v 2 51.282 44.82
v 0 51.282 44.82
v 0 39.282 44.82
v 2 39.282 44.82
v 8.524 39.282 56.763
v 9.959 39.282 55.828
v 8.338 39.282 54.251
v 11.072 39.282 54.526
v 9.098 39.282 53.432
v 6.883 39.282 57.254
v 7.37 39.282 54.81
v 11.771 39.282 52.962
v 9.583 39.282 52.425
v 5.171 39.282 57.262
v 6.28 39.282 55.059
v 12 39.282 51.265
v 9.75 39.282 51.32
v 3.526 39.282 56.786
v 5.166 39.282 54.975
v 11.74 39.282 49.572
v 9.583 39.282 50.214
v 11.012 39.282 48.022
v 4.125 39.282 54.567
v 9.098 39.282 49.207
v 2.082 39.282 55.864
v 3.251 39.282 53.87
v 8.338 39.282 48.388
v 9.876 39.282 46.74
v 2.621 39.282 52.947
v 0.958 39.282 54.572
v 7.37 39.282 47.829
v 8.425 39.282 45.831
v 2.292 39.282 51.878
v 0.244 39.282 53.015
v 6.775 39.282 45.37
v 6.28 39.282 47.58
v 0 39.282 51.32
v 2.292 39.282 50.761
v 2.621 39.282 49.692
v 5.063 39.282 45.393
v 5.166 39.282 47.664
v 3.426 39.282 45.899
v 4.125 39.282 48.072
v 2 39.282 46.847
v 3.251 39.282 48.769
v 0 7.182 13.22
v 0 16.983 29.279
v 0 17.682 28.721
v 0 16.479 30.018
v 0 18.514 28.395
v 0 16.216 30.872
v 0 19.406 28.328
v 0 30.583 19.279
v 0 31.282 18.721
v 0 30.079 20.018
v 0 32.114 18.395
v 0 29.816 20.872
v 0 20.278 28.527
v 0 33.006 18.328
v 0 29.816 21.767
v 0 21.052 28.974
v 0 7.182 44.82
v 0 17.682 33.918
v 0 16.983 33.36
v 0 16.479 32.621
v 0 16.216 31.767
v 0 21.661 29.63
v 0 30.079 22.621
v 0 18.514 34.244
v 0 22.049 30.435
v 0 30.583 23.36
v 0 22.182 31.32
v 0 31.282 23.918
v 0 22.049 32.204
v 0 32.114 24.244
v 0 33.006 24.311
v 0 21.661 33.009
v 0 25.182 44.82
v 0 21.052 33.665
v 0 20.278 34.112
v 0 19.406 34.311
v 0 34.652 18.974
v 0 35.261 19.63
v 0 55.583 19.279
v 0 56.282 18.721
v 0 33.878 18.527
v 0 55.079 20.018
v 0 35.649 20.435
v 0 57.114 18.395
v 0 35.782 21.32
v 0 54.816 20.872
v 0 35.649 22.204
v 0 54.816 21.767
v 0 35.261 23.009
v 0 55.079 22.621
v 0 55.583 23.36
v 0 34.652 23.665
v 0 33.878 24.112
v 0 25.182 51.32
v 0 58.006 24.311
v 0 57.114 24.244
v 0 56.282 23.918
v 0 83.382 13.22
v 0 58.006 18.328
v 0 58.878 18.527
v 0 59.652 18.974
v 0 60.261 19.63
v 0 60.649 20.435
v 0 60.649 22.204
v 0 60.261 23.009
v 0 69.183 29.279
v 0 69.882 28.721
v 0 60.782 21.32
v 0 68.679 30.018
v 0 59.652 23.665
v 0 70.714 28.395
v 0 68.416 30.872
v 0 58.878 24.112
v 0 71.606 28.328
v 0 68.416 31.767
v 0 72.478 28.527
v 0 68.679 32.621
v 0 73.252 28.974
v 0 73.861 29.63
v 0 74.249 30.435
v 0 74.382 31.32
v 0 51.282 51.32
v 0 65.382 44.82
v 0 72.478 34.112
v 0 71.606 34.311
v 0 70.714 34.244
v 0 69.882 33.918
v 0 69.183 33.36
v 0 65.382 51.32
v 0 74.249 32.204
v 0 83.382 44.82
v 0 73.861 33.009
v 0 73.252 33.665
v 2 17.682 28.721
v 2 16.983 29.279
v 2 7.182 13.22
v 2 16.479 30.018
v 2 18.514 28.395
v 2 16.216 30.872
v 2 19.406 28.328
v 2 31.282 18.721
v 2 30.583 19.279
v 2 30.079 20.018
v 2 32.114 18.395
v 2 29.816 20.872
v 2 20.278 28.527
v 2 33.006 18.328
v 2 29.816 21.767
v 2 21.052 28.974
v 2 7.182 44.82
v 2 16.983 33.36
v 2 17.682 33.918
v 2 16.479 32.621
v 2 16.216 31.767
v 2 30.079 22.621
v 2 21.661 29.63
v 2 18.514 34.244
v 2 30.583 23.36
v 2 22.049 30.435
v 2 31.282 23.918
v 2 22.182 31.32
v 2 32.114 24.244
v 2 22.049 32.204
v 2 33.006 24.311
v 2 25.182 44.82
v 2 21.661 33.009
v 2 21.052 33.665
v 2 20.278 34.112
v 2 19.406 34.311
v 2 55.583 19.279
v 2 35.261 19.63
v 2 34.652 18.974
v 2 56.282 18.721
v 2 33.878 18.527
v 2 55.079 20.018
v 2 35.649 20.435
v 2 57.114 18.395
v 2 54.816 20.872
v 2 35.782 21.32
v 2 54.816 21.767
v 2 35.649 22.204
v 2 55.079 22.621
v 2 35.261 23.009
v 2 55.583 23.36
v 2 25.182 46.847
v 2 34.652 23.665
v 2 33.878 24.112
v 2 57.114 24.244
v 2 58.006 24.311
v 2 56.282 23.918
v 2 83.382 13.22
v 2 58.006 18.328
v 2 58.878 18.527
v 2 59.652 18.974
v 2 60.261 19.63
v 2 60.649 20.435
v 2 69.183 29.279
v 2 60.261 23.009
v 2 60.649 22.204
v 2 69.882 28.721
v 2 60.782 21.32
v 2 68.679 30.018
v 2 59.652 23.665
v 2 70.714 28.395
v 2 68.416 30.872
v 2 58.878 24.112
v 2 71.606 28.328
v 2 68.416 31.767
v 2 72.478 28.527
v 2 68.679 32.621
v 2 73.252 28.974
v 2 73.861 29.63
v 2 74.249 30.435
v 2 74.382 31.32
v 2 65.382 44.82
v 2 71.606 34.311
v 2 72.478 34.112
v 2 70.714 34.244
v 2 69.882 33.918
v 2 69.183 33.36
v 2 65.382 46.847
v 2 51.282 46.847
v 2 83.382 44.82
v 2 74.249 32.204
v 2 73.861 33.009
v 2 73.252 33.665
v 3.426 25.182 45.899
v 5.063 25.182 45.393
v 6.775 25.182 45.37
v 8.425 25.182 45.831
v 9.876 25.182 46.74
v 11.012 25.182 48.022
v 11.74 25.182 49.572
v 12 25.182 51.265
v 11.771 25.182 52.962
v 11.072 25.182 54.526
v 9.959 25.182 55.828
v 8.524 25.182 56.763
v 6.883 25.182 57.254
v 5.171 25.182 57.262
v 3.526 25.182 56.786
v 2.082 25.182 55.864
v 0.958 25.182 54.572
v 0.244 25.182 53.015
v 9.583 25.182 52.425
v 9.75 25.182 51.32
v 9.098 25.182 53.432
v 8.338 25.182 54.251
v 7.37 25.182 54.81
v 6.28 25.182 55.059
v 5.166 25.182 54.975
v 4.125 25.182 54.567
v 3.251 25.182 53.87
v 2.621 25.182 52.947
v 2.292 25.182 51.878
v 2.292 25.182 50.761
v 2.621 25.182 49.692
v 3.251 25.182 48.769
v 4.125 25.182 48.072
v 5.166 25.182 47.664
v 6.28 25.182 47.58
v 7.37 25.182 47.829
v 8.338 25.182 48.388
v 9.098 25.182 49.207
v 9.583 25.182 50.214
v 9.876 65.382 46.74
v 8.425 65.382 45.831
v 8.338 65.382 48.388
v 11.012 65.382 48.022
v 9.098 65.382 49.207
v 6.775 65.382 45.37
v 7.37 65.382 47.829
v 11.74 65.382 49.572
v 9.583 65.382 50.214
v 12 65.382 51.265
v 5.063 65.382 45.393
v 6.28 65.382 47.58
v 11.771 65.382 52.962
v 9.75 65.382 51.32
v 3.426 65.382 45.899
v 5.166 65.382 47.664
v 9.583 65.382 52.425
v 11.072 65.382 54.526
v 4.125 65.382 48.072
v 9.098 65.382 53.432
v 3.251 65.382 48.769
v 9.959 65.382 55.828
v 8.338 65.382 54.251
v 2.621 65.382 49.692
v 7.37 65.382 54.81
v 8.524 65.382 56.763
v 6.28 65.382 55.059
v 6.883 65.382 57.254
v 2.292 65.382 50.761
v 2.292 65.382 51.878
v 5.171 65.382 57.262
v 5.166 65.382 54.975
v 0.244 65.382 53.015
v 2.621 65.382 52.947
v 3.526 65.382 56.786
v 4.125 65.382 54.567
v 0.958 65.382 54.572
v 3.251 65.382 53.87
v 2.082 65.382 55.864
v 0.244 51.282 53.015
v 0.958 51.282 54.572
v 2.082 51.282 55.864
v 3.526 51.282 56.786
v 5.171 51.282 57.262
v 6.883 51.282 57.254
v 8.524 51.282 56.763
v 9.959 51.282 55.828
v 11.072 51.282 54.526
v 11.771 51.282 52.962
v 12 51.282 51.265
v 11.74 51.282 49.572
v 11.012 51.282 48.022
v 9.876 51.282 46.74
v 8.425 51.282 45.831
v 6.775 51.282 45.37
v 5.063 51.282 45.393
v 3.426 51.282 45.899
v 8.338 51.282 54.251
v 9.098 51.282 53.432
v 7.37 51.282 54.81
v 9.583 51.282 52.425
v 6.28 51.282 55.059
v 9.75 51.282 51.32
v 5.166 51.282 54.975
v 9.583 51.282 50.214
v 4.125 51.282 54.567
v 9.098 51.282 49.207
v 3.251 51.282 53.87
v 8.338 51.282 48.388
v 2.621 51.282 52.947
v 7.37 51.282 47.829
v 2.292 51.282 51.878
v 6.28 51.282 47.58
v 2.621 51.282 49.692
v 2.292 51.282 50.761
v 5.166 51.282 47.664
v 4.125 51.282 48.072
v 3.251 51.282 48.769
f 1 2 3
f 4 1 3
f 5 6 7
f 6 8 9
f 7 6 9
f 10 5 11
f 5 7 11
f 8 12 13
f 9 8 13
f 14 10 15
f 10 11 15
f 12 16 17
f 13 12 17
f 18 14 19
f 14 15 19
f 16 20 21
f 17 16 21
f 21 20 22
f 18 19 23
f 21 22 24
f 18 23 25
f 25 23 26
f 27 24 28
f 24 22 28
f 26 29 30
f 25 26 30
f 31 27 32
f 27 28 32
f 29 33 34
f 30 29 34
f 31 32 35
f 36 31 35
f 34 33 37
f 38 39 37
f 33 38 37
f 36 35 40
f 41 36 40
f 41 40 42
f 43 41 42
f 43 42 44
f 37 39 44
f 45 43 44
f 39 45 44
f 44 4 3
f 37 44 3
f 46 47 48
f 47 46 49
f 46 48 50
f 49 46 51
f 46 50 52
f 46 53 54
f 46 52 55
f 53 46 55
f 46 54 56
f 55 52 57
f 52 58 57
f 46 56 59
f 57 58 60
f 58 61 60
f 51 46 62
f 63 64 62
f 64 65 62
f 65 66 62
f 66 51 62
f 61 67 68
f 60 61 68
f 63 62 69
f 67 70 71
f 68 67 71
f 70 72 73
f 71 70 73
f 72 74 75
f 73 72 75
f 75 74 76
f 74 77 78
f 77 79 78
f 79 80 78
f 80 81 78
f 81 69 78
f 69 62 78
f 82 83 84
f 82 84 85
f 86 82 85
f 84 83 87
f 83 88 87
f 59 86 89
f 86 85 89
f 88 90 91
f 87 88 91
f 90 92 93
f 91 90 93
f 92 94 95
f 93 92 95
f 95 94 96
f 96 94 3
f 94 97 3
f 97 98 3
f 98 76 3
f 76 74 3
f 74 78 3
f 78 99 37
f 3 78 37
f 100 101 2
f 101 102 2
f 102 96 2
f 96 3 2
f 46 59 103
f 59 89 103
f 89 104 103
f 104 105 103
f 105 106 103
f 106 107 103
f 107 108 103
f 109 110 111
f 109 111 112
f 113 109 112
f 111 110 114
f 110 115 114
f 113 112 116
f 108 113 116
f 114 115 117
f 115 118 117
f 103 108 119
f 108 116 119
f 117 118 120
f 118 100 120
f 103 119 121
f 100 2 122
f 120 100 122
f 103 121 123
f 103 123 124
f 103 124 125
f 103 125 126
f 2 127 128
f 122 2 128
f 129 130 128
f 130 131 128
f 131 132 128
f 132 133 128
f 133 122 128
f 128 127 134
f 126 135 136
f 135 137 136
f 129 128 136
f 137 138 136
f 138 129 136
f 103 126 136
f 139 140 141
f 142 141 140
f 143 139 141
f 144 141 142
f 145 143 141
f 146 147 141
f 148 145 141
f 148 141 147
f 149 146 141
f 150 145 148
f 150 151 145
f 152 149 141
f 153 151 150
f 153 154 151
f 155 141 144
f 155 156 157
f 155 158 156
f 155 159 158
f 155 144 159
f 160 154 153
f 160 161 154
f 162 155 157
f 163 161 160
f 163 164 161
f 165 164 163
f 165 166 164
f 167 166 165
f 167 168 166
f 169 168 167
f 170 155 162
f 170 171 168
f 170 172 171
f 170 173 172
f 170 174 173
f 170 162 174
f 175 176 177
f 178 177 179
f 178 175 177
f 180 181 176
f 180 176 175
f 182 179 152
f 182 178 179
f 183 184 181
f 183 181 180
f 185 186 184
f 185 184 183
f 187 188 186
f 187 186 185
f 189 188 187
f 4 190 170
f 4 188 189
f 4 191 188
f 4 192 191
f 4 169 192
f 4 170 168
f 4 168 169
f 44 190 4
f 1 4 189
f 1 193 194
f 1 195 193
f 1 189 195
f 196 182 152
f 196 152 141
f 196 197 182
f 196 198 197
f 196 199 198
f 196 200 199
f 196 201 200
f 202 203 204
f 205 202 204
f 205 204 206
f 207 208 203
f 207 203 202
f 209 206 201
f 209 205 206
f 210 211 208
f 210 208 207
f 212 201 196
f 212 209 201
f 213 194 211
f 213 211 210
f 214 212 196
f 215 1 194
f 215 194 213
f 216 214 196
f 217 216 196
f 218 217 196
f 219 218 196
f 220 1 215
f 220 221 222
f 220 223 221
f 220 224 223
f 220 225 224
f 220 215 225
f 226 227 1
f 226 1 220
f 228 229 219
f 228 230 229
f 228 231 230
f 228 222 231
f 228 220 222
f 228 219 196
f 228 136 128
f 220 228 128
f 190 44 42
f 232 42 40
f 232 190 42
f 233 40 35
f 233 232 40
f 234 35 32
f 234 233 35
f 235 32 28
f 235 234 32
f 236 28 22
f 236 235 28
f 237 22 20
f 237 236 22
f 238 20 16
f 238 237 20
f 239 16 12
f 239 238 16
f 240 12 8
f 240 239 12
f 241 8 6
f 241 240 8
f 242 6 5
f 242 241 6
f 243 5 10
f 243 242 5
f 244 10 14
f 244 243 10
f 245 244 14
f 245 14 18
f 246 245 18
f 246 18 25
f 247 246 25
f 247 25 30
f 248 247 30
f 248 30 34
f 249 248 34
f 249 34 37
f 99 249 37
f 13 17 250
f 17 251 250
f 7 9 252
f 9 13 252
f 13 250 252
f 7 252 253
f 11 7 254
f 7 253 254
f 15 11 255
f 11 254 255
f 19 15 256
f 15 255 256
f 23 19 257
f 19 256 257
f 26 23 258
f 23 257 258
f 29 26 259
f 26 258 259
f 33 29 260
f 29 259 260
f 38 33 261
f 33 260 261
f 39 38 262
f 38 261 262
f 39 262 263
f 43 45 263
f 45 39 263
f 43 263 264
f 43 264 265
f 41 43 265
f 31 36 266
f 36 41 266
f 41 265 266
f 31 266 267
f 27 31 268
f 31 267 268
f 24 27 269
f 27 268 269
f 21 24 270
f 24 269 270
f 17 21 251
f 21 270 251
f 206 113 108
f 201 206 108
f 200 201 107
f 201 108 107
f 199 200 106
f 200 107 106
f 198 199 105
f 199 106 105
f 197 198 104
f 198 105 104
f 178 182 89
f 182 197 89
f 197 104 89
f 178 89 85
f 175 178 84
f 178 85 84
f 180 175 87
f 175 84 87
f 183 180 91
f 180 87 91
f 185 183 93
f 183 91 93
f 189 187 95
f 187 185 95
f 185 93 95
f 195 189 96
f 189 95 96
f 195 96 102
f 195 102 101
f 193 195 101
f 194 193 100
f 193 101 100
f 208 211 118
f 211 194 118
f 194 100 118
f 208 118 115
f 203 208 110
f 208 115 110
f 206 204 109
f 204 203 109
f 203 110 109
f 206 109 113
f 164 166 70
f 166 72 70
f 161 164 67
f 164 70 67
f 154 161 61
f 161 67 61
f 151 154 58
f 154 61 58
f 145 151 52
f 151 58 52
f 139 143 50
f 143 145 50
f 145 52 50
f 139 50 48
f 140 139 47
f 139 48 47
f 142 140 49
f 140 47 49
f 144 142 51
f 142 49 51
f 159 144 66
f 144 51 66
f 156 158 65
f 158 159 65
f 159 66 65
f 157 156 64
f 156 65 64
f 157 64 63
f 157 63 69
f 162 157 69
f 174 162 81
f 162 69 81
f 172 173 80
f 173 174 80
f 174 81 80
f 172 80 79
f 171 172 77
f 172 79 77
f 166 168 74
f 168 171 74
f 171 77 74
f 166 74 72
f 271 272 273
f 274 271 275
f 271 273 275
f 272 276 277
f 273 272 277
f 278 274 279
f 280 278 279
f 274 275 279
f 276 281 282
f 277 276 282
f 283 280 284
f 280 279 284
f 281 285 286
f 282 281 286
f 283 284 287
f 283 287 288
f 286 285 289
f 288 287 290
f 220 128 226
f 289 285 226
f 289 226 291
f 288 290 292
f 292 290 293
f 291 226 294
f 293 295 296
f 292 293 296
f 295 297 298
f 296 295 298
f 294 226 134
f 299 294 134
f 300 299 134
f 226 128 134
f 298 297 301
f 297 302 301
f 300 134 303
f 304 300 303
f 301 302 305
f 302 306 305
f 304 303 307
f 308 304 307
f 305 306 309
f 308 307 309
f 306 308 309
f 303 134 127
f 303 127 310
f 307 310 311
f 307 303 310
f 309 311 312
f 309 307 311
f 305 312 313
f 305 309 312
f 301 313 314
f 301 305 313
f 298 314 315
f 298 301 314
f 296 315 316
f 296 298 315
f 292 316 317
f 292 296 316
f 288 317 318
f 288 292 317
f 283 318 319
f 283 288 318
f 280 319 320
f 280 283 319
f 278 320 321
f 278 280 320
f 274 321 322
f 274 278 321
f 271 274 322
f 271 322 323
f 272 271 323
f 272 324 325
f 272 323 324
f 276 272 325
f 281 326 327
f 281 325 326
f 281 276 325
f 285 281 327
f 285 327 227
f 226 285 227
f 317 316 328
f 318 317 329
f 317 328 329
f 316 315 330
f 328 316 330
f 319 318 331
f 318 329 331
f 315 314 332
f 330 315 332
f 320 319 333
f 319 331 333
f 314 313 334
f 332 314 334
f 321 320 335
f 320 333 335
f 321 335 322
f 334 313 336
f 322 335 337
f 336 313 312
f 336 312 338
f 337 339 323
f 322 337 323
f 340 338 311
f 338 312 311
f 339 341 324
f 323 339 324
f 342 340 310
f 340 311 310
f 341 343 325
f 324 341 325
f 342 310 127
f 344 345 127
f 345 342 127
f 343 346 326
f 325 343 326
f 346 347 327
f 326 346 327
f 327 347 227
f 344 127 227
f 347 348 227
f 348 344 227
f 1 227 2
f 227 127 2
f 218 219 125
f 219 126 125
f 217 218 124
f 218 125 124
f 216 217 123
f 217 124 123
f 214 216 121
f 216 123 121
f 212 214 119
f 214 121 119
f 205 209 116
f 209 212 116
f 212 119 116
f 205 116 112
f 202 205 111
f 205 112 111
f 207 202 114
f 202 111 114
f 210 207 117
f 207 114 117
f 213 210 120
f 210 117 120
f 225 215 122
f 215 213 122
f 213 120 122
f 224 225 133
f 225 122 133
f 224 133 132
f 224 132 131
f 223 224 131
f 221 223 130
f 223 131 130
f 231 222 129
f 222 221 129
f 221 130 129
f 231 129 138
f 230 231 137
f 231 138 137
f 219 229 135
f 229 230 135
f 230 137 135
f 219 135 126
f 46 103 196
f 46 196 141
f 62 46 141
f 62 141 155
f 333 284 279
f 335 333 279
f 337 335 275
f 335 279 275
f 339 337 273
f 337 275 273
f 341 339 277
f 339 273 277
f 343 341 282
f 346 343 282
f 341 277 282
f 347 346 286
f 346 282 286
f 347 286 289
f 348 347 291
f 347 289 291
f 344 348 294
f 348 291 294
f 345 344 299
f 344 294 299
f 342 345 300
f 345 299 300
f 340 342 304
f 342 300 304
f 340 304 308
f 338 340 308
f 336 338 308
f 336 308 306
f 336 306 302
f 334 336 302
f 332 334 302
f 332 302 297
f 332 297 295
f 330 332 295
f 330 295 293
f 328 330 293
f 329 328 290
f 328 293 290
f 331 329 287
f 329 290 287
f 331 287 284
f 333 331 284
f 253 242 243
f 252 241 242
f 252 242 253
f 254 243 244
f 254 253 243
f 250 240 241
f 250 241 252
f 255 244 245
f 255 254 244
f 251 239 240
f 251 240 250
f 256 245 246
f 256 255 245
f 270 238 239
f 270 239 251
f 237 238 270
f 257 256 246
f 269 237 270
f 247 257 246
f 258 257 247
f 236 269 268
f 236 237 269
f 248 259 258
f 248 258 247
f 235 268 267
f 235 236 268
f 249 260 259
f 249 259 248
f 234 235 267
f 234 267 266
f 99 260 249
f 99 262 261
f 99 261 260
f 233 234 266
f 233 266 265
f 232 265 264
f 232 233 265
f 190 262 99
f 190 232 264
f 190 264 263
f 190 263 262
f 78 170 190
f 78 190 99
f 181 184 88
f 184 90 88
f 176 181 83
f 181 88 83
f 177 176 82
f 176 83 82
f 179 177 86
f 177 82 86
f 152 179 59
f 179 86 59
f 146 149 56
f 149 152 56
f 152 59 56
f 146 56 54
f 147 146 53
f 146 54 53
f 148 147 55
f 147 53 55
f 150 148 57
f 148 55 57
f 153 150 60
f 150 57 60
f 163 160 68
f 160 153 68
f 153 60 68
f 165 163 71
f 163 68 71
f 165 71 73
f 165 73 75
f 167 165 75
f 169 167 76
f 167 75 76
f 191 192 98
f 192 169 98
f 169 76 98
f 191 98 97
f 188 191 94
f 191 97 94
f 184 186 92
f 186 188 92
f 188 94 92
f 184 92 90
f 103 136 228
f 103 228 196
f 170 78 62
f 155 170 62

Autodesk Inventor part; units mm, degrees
ref_plane "YZ Plane" through (0, 0, 0) normal (1, 0, 0) x (0, 1, 0)
ref_plane "XZ Plane" through (0, 0, 0) normal (0, 1, 0) x (-1, 0, 0)
sketch "Sketch1" plane through (0, 0, 0) normal (1, 0, 0) x (0, 1, 0)
  line L0 (7.182, 51.3195) -> (83.382, 51.3195)
  line L1 (83.382, 51.3195) -> (83.382, 13.2195)
  line L2 (83.382, 13.2195) -> (7.182, 13.2195)
  line L3 (7.182, 13.2195) -> (7.182, 51.3195)
  line L4 (39.282, 51.3195) -> (51.282, 51.3195)
  line L5 (51.282, 51.3195) -> (51.282, 44.8195)
  line L6 (51.282, 44.8195) -> (39.282, 44.8195)
  line L7 (39.282, 44.8195) -> (39.282, 51.3195)
  line L8 (45.282, 13.2195) -> (45.282, 51.3195) construction
  line L9 (83.382, 44.8195) -> (65.382, 44.8195)
  line L10 (65.382, 44.8195) -> (65.382, 51.3195)
  line L11 (65.382, 51.3195) -> (83.382, 51.3195)
  line L12 (83.382, 51.3195) -> (83.382, 44.8195)
  line L13 (7.182, 51.3195) -> (25.182, 51.3195)
  line L14 (25.182, 51.3195) -> (25.182, 44.8195)
  line L15 (25.182, 44.8195) -> (7.182, 44.8195)
  line L16 (7.182, 44.8195) -> (7.182, 51.3195)
  circle A0 centre (71.382, 31.3195) radius 3
  circle A1 centre (57.782, 21.3195) radius 3
  circle A2 centre (19.182, 31.3195) radius 3
  circle A3 centre (32.782, 21.3195) radius 3
  point P0 (0, 0)
  point P1 (7.182, 44.8195)
  dimension "d0" = 38.1
  dimension "d1" = 76.2
  dimension "d2" = 12
  dimension "d3" = 6.5
  dimension "d4" = 18
  dimension "d7" = 6
  dimension "d8" = 6
  dimension "d9" = 20
  dimension "d10" = 30
  dimension "d11" = 12.5
  dimension "d12" = 26.1
extrude "Extrusion1" add sketch "Sketch1" along normal blind 2 contours L0 L7 L6 L5 L10 L9 L1 L2 L3 L15 L14
ref_plane "Work Plane1" through (2, 45.282, 44.8195) normal (0, -1, 0) x (1, 0, 0)
sketch "Sketch2" plane through (0, 65.382, 51.3195) normal (0, 1, 0) x (1, 0, 0)
  line L0 (0, 6.5) -> (0, 0) projected
  line L1 (0, 0) -> (2, 0) projected
  line L2 (2, 6.5) -> (2, 0) projected
  line L3 (0, 6.5) -> (2, 6.5) projected
  circle A0 centre (6, 0) radius 6
  circle A1 centre (6, 0) radius 3.75
  point P0 (0, 51.3195)
  point P1 (2, 4.4721)
  dimension "d13" = 12
  dimension "d14" = 7.5
  dimension "d15" = 4
extrude "Extrusion2" add sketch "Sketch2" against normal up to surface (14.1 mm away) contours L1 L2 A0 picked at (11.1556, -0.7778)
mirror "Mirror1" about plane through (2, 45.282, 44.8195) normal (0, -1, 0) of "Extrusion2"
equation "\"d8\" = d7"
properties part number "zawias-prawy" material "Stainless Steel"
